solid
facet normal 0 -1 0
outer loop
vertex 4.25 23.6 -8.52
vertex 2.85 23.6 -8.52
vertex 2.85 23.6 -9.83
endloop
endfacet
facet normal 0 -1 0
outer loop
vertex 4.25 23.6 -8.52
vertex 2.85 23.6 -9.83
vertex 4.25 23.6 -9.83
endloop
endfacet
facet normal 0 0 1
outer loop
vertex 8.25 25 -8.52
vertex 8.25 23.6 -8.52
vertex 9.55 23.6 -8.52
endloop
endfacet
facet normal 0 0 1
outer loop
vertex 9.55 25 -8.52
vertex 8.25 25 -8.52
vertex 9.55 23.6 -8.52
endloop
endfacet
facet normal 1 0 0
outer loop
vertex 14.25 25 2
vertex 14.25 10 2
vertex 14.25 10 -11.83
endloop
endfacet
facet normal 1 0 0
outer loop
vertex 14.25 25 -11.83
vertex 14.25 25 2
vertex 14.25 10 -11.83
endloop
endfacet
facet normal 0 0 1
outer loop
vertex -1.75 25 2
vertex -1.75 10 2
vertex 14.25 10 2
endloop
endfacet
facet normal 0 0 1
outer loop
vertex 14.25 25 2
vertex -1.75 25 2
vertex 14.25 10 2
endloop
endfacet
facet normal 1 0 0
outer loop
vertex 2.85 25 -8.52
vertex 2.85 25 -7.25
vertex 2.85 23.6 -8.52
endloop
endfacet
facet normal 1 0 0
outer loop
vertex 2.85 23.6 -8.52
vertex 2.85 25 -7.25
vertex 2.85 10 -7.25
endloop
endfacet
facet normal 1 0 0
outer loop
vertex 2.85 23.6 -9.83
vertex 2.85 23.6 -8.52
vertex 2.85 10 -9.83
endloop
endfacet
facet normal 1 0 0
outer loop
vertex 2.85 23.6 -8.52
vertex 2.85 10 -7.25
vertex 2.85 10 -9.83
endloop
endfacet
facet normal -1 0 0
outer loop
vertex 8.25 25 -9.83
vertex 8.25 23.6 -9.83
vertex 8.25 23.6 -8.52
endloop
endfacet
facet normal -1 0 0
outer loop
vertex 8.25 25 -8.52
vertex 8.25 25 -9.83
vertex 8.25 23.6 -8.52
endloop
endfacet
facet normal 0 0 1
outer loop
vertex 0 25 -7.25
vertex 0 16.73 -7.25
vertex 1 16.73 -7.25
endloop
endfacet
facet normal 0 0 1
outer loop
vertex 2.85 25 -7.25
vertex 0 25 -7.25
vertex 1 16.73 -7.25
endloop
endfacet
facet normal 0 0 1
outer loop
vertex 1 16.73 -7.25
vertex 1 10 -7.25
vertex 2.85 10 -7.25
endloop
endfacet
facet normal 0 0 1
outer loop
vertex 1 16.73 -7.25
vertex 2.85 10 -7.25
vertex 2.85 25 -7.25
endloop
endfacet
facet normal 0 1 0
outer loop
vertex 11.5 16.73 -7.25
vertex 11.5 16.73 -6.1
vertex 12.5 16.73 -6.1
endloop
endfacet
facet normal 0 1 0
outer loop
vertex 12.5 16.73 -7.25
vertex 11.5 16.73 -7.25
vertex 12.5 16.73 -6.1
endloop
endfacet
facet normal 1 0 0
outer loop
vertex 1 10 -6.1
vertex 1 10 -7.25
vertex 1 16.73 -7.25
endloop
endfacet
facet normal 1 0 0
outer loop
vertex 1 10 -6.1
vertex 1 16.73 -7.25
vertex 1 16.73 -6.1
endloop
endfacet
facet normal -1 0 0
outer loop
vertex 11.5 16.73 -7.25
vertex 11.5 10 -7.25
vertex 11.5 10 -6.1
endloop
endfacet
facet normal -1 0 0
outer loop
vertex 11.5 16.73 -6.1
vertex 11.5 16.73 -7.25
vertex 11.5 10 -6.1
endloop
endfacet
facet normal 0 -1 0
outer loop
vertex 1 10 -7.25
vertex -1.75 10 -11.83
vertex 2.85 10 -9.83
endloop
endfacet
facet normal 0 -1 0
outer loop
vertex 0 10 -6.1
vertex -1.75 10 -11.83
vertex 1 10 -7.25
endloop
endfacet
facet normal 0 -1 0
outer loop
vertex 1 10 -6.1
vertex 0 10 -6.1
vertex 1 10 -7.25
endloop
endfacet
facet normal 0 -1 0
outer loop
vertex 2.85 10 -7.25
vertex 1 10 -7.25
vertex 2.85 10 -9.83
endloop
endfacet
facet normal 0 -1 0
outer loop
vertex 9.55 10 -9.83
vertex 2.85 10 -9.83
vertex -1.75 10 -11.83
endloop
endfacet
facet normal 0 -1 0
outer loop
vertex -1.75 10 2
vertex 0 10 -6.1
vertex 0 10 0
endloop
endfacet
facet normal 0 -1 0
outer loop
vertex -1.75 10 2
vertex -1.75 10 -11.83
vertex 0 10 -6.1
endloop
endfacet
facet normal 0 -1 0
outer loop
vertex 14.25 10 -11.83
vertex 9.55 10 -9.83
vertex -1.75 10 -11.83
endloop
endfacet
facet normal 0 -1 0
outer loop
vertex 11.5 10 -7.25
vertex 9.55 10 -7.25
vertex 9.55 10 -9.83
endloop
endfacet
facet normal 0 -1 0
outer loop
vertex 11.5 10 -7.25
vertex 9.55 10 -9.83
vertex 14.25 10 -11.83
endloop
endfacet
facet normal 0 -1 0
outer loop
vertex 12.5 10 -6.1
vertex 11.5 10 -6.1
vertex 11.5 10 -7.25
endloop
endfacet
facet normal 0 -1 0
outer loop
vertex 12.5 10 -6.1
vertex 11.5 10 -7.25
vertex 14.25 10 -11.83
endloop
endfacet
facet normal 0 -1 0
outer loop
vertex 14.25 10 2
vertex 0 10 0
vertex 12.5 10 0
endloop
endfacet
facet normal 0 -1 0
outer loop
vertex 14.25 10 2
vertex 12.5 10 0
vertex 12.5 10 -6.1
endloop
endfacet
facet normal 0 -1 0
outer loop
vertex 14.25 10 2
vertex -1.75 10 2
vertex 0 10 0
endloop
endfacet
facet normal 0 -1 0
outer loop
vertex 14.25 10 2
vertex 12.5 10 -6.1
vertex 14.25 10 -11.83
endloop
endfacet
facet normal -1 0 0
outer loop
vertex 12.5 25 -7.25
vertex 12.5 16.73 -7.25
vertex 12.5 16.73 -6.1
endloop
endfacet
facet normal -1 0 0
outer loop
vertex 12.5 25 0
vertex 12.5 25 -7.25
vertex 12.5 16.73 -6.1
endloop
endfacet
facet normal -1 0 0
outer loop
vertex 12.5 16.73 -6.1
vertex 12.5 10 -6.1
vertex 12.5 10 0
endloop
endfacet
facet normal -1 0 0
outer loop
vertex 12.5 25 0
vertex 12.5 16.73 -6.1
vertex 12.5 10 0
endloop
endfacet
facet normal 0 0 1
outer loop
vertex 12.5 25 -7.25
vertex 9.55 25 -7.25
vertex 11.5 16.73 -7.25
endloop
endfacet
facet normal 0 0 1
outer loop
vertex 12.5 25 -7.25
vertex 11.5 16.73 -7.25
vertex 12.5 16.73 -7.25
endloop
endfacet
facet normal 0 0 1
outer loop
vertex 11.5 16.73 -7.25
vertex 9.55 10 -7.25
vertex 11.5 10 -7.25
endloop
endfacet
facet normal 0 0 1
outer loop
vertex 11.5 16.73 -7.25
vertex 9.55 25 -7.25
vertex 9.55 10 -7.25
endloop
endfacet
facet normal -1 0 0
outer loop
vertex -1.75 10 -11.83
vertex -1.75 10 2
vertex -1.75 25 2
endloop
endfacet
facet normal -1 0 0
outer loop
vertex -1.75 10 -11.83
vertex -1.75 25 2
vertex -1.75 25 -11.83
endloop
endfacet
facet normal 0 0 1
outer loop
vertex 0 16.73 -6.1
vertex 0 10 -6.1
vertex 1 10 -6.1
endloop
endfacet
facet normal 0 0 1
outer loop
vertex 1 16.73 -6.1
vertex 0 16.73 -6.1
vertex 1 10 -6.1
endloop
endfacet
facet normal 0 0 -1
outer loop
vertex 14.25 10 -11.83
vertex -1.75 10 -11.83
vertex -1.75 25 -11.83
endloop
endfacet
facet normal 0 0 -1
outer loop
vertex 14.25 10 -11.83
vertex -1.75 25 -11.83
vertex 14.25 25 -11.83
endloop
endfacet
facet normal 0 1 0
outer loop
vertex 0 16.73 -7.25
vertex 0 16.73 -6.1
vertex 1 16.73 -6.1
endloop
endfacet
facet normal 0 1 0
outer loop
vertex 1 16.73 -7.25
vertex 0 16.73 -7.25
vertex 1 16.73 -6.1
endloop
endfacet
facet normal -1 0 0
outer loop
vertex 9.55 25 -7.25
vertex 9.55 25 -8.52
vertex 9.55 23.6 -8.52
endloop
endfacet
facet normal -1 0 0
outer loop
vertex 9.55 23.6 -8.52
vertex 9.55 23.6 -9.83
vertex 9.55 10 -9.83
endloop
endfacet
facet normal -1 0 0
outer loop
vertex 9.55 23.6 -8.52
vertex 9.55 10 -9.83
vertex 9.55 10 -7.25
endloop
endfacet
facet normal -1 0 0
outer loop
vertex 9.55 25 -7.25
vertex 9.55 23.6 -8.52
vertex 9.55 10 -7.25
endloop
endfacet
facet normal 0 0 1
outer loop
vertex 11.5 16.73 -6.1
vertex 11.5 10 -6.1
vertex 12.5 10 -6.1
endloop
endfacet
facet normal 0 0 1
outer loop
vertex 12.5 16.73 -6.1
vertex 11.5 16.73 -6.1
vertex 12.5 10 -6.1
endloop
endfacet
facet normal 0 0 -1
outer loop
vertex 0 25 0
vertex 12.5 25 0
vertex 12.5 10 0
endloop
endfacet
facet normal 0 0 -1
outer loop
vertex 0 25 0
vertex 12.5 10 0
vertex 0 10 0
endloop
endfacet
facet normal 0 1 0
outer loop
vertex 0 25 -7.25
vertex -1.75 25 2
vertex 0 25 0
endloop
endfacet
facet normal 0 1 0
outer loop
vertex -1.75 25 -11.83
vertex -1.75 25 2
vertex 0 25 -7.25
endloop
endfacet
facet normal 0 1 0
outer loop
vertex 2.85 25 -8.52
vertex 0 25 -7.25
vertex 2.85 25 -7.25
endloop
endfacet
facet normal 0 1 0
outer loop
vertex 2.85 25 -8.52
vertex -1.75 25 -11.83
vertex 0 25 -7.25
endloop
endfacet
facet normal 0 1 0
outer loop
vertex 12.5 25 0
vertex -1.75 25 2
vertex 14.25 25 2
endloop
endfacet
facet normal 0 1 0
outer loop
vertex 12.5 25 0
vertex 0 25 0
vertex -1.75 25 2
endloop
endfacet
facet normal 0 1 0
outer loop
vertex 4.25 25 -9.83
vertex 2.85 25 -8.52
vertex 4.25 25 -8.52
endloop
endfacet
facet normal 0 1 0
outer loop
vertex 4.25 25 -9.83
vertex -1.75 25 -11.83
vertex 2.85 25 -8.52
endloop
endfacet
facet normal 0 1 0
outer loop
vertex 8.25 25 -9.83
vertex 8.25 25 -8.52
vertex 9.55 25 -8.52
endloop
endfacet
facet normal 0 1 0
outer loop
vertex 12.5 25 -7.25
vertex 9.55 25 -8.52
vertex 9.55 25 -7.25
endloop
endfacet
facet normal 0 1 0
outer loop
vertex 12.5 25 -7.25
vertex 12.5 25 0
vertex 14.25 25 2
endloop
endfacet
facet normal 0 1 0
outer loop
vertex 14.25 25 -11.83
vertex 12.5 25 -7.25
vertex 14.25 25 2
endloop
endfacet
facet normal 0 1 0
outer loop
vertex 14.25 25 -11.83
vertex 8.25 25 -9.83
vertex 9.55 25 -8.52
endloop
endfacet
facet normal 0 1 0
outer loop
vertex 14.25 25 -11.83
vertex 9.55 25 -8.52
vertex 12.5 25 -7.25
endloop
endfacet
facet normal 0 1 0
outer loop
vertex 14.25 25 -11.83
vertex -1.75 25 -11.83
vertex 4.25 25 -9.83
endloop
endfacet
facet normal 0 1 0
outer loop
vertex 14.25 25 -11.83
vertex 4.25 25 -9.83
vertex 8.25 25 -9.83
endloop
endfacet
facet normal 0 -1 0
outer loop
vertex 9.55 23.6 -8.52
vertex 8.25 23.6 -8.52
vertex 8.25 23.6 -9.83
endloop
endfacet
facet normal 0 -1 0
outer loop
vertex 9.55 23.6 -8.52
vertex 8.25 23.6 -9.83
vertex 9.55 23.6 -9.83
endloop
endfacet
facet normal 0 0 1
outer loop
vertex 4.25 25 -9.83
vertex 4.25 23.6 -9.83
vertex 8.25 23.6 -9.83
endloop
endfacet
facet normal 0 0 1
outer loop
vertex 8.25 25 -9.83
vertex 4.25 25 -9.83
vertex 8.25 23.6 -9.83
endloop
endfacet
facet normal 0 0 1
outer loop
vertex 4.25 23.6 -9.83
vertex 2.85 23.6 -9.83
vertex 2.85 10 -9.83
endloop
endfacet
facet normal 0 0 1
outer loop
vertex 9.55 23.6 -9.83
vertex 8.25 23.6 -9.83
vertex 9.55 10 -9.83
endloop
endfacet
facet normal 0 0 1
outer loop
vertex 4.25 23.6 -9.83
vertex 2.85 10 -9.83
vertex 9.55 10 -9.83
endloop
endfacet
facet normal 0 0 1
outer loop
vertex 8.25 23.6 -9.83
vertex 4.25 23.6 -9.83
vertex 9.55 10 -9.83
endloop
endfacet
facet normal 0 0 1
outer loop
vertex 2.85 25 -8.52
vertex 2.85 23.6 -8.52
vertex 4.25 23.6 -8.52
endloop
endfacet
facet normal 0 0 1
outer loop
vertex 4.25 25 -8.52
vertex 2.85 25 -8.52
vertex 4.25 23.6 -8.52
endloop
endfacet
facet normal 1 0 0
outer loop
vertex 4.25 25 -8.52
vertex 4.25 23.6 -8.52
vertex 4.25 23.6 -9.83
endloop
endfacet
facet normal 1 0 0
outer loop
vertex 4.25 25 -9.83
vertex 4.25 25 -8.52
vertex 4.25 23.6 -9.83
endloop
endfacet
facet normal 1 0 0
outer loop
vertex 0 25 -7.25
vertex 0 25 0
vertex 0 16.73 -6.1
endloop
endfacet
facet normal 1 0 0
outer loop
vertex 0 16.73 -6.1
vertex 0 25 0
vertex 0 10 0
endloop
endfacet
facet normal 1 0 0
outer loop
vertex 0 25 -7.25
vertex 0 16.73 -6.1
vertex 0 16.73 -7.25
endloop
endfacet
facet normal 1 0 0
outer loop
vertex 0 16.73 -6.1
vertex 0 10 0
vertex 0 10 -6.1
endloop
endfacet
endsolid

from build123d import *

# Parameters (mm, degrees)
SKETCH1_W           = 16
SKETCH1_H           = 13.83
BOSS_EXTRUDE1_DEPTH = 25
SKETCH2_W           = 1
SKETCH2_H           = 1.15
BOSS_EXTRUDE3_DEPTH = 16.73
SKETCH3_W           = 1.4
SKETCH3_H           = 1.31
SKETCH3_W_2         = 1.3
CUT_EXTRUDE1_DEPTH  = 23.6
SKETCH5_W           = 16
SKETCH5_H           = 13.83
CUT_EXTRUDE2_DEPTH  = 10


with BuildPart() as part:
    # Sketch1 → Boss-Extrude1 (new body)
    with BuildSketch(Plane(origin=(0, 0, 0), x_dir=(1, 0, 0), z_dir=(0, 1, 0))):
        with Locations((6.25, 4.915)):
            Rectangle(SKETCH1_W, SKETCH1_H)
        Polygon((0, 0), (0, 7.25), (2.85, 7.25), (2.85, 8.52), (4.25, 8.52), (4.25, 9.83), (8.25, 9.83), (8.25, 8.52), (9.55, 8.52), (9.55, 7.25), (12.5, 7.25), (12.5, 0), align=None, mode=Mode.SUBTRACT)
    extrude(amount=BOSS_EXTRUDE1_DEPTH)

    # Sketch2 → Boss-Extrude3 (add)
    with BuildSketch(Plane.XZ):
        with Locations((12, -6.675)):
            Rectangle(SKETCH2_W, SKETCH2_H)
        with Locations((0.5, -6.675)):
            Rectangle(SKETCH2_W, SKETCH2_H)
    extrude(amount=-BOSS_EXTRUDE3_DEPTH)

    # Sketch3 → Cut-Extrude1 (cut)
    with BuildSketch(Plane.XZ):
        with Locations((3.55, -9.175)):
            Rectangle(SKETCH3_W, SKETCH3_H)
        with Locations((8.9, -9.175)):
            Rectangle(SKETCH3_W_2, SKETCH3_H)
    extrude(amount=-CUT_EXTRUDE1_DEPTH, mode=Mode.SUBTRACT)

    # Sketch5 → Cut-Extrude2 (cut)
    with BuildSketch(Plane.XZ):
        with Locations((6.25, -4.915)):
            Rectangle(SKETCH5_W, SKETCH5_H)
    extrude(amount=-CUT_EXTRUDE2_DEPTH, mode=Mode.SUBTRACT)


solid = part.part
